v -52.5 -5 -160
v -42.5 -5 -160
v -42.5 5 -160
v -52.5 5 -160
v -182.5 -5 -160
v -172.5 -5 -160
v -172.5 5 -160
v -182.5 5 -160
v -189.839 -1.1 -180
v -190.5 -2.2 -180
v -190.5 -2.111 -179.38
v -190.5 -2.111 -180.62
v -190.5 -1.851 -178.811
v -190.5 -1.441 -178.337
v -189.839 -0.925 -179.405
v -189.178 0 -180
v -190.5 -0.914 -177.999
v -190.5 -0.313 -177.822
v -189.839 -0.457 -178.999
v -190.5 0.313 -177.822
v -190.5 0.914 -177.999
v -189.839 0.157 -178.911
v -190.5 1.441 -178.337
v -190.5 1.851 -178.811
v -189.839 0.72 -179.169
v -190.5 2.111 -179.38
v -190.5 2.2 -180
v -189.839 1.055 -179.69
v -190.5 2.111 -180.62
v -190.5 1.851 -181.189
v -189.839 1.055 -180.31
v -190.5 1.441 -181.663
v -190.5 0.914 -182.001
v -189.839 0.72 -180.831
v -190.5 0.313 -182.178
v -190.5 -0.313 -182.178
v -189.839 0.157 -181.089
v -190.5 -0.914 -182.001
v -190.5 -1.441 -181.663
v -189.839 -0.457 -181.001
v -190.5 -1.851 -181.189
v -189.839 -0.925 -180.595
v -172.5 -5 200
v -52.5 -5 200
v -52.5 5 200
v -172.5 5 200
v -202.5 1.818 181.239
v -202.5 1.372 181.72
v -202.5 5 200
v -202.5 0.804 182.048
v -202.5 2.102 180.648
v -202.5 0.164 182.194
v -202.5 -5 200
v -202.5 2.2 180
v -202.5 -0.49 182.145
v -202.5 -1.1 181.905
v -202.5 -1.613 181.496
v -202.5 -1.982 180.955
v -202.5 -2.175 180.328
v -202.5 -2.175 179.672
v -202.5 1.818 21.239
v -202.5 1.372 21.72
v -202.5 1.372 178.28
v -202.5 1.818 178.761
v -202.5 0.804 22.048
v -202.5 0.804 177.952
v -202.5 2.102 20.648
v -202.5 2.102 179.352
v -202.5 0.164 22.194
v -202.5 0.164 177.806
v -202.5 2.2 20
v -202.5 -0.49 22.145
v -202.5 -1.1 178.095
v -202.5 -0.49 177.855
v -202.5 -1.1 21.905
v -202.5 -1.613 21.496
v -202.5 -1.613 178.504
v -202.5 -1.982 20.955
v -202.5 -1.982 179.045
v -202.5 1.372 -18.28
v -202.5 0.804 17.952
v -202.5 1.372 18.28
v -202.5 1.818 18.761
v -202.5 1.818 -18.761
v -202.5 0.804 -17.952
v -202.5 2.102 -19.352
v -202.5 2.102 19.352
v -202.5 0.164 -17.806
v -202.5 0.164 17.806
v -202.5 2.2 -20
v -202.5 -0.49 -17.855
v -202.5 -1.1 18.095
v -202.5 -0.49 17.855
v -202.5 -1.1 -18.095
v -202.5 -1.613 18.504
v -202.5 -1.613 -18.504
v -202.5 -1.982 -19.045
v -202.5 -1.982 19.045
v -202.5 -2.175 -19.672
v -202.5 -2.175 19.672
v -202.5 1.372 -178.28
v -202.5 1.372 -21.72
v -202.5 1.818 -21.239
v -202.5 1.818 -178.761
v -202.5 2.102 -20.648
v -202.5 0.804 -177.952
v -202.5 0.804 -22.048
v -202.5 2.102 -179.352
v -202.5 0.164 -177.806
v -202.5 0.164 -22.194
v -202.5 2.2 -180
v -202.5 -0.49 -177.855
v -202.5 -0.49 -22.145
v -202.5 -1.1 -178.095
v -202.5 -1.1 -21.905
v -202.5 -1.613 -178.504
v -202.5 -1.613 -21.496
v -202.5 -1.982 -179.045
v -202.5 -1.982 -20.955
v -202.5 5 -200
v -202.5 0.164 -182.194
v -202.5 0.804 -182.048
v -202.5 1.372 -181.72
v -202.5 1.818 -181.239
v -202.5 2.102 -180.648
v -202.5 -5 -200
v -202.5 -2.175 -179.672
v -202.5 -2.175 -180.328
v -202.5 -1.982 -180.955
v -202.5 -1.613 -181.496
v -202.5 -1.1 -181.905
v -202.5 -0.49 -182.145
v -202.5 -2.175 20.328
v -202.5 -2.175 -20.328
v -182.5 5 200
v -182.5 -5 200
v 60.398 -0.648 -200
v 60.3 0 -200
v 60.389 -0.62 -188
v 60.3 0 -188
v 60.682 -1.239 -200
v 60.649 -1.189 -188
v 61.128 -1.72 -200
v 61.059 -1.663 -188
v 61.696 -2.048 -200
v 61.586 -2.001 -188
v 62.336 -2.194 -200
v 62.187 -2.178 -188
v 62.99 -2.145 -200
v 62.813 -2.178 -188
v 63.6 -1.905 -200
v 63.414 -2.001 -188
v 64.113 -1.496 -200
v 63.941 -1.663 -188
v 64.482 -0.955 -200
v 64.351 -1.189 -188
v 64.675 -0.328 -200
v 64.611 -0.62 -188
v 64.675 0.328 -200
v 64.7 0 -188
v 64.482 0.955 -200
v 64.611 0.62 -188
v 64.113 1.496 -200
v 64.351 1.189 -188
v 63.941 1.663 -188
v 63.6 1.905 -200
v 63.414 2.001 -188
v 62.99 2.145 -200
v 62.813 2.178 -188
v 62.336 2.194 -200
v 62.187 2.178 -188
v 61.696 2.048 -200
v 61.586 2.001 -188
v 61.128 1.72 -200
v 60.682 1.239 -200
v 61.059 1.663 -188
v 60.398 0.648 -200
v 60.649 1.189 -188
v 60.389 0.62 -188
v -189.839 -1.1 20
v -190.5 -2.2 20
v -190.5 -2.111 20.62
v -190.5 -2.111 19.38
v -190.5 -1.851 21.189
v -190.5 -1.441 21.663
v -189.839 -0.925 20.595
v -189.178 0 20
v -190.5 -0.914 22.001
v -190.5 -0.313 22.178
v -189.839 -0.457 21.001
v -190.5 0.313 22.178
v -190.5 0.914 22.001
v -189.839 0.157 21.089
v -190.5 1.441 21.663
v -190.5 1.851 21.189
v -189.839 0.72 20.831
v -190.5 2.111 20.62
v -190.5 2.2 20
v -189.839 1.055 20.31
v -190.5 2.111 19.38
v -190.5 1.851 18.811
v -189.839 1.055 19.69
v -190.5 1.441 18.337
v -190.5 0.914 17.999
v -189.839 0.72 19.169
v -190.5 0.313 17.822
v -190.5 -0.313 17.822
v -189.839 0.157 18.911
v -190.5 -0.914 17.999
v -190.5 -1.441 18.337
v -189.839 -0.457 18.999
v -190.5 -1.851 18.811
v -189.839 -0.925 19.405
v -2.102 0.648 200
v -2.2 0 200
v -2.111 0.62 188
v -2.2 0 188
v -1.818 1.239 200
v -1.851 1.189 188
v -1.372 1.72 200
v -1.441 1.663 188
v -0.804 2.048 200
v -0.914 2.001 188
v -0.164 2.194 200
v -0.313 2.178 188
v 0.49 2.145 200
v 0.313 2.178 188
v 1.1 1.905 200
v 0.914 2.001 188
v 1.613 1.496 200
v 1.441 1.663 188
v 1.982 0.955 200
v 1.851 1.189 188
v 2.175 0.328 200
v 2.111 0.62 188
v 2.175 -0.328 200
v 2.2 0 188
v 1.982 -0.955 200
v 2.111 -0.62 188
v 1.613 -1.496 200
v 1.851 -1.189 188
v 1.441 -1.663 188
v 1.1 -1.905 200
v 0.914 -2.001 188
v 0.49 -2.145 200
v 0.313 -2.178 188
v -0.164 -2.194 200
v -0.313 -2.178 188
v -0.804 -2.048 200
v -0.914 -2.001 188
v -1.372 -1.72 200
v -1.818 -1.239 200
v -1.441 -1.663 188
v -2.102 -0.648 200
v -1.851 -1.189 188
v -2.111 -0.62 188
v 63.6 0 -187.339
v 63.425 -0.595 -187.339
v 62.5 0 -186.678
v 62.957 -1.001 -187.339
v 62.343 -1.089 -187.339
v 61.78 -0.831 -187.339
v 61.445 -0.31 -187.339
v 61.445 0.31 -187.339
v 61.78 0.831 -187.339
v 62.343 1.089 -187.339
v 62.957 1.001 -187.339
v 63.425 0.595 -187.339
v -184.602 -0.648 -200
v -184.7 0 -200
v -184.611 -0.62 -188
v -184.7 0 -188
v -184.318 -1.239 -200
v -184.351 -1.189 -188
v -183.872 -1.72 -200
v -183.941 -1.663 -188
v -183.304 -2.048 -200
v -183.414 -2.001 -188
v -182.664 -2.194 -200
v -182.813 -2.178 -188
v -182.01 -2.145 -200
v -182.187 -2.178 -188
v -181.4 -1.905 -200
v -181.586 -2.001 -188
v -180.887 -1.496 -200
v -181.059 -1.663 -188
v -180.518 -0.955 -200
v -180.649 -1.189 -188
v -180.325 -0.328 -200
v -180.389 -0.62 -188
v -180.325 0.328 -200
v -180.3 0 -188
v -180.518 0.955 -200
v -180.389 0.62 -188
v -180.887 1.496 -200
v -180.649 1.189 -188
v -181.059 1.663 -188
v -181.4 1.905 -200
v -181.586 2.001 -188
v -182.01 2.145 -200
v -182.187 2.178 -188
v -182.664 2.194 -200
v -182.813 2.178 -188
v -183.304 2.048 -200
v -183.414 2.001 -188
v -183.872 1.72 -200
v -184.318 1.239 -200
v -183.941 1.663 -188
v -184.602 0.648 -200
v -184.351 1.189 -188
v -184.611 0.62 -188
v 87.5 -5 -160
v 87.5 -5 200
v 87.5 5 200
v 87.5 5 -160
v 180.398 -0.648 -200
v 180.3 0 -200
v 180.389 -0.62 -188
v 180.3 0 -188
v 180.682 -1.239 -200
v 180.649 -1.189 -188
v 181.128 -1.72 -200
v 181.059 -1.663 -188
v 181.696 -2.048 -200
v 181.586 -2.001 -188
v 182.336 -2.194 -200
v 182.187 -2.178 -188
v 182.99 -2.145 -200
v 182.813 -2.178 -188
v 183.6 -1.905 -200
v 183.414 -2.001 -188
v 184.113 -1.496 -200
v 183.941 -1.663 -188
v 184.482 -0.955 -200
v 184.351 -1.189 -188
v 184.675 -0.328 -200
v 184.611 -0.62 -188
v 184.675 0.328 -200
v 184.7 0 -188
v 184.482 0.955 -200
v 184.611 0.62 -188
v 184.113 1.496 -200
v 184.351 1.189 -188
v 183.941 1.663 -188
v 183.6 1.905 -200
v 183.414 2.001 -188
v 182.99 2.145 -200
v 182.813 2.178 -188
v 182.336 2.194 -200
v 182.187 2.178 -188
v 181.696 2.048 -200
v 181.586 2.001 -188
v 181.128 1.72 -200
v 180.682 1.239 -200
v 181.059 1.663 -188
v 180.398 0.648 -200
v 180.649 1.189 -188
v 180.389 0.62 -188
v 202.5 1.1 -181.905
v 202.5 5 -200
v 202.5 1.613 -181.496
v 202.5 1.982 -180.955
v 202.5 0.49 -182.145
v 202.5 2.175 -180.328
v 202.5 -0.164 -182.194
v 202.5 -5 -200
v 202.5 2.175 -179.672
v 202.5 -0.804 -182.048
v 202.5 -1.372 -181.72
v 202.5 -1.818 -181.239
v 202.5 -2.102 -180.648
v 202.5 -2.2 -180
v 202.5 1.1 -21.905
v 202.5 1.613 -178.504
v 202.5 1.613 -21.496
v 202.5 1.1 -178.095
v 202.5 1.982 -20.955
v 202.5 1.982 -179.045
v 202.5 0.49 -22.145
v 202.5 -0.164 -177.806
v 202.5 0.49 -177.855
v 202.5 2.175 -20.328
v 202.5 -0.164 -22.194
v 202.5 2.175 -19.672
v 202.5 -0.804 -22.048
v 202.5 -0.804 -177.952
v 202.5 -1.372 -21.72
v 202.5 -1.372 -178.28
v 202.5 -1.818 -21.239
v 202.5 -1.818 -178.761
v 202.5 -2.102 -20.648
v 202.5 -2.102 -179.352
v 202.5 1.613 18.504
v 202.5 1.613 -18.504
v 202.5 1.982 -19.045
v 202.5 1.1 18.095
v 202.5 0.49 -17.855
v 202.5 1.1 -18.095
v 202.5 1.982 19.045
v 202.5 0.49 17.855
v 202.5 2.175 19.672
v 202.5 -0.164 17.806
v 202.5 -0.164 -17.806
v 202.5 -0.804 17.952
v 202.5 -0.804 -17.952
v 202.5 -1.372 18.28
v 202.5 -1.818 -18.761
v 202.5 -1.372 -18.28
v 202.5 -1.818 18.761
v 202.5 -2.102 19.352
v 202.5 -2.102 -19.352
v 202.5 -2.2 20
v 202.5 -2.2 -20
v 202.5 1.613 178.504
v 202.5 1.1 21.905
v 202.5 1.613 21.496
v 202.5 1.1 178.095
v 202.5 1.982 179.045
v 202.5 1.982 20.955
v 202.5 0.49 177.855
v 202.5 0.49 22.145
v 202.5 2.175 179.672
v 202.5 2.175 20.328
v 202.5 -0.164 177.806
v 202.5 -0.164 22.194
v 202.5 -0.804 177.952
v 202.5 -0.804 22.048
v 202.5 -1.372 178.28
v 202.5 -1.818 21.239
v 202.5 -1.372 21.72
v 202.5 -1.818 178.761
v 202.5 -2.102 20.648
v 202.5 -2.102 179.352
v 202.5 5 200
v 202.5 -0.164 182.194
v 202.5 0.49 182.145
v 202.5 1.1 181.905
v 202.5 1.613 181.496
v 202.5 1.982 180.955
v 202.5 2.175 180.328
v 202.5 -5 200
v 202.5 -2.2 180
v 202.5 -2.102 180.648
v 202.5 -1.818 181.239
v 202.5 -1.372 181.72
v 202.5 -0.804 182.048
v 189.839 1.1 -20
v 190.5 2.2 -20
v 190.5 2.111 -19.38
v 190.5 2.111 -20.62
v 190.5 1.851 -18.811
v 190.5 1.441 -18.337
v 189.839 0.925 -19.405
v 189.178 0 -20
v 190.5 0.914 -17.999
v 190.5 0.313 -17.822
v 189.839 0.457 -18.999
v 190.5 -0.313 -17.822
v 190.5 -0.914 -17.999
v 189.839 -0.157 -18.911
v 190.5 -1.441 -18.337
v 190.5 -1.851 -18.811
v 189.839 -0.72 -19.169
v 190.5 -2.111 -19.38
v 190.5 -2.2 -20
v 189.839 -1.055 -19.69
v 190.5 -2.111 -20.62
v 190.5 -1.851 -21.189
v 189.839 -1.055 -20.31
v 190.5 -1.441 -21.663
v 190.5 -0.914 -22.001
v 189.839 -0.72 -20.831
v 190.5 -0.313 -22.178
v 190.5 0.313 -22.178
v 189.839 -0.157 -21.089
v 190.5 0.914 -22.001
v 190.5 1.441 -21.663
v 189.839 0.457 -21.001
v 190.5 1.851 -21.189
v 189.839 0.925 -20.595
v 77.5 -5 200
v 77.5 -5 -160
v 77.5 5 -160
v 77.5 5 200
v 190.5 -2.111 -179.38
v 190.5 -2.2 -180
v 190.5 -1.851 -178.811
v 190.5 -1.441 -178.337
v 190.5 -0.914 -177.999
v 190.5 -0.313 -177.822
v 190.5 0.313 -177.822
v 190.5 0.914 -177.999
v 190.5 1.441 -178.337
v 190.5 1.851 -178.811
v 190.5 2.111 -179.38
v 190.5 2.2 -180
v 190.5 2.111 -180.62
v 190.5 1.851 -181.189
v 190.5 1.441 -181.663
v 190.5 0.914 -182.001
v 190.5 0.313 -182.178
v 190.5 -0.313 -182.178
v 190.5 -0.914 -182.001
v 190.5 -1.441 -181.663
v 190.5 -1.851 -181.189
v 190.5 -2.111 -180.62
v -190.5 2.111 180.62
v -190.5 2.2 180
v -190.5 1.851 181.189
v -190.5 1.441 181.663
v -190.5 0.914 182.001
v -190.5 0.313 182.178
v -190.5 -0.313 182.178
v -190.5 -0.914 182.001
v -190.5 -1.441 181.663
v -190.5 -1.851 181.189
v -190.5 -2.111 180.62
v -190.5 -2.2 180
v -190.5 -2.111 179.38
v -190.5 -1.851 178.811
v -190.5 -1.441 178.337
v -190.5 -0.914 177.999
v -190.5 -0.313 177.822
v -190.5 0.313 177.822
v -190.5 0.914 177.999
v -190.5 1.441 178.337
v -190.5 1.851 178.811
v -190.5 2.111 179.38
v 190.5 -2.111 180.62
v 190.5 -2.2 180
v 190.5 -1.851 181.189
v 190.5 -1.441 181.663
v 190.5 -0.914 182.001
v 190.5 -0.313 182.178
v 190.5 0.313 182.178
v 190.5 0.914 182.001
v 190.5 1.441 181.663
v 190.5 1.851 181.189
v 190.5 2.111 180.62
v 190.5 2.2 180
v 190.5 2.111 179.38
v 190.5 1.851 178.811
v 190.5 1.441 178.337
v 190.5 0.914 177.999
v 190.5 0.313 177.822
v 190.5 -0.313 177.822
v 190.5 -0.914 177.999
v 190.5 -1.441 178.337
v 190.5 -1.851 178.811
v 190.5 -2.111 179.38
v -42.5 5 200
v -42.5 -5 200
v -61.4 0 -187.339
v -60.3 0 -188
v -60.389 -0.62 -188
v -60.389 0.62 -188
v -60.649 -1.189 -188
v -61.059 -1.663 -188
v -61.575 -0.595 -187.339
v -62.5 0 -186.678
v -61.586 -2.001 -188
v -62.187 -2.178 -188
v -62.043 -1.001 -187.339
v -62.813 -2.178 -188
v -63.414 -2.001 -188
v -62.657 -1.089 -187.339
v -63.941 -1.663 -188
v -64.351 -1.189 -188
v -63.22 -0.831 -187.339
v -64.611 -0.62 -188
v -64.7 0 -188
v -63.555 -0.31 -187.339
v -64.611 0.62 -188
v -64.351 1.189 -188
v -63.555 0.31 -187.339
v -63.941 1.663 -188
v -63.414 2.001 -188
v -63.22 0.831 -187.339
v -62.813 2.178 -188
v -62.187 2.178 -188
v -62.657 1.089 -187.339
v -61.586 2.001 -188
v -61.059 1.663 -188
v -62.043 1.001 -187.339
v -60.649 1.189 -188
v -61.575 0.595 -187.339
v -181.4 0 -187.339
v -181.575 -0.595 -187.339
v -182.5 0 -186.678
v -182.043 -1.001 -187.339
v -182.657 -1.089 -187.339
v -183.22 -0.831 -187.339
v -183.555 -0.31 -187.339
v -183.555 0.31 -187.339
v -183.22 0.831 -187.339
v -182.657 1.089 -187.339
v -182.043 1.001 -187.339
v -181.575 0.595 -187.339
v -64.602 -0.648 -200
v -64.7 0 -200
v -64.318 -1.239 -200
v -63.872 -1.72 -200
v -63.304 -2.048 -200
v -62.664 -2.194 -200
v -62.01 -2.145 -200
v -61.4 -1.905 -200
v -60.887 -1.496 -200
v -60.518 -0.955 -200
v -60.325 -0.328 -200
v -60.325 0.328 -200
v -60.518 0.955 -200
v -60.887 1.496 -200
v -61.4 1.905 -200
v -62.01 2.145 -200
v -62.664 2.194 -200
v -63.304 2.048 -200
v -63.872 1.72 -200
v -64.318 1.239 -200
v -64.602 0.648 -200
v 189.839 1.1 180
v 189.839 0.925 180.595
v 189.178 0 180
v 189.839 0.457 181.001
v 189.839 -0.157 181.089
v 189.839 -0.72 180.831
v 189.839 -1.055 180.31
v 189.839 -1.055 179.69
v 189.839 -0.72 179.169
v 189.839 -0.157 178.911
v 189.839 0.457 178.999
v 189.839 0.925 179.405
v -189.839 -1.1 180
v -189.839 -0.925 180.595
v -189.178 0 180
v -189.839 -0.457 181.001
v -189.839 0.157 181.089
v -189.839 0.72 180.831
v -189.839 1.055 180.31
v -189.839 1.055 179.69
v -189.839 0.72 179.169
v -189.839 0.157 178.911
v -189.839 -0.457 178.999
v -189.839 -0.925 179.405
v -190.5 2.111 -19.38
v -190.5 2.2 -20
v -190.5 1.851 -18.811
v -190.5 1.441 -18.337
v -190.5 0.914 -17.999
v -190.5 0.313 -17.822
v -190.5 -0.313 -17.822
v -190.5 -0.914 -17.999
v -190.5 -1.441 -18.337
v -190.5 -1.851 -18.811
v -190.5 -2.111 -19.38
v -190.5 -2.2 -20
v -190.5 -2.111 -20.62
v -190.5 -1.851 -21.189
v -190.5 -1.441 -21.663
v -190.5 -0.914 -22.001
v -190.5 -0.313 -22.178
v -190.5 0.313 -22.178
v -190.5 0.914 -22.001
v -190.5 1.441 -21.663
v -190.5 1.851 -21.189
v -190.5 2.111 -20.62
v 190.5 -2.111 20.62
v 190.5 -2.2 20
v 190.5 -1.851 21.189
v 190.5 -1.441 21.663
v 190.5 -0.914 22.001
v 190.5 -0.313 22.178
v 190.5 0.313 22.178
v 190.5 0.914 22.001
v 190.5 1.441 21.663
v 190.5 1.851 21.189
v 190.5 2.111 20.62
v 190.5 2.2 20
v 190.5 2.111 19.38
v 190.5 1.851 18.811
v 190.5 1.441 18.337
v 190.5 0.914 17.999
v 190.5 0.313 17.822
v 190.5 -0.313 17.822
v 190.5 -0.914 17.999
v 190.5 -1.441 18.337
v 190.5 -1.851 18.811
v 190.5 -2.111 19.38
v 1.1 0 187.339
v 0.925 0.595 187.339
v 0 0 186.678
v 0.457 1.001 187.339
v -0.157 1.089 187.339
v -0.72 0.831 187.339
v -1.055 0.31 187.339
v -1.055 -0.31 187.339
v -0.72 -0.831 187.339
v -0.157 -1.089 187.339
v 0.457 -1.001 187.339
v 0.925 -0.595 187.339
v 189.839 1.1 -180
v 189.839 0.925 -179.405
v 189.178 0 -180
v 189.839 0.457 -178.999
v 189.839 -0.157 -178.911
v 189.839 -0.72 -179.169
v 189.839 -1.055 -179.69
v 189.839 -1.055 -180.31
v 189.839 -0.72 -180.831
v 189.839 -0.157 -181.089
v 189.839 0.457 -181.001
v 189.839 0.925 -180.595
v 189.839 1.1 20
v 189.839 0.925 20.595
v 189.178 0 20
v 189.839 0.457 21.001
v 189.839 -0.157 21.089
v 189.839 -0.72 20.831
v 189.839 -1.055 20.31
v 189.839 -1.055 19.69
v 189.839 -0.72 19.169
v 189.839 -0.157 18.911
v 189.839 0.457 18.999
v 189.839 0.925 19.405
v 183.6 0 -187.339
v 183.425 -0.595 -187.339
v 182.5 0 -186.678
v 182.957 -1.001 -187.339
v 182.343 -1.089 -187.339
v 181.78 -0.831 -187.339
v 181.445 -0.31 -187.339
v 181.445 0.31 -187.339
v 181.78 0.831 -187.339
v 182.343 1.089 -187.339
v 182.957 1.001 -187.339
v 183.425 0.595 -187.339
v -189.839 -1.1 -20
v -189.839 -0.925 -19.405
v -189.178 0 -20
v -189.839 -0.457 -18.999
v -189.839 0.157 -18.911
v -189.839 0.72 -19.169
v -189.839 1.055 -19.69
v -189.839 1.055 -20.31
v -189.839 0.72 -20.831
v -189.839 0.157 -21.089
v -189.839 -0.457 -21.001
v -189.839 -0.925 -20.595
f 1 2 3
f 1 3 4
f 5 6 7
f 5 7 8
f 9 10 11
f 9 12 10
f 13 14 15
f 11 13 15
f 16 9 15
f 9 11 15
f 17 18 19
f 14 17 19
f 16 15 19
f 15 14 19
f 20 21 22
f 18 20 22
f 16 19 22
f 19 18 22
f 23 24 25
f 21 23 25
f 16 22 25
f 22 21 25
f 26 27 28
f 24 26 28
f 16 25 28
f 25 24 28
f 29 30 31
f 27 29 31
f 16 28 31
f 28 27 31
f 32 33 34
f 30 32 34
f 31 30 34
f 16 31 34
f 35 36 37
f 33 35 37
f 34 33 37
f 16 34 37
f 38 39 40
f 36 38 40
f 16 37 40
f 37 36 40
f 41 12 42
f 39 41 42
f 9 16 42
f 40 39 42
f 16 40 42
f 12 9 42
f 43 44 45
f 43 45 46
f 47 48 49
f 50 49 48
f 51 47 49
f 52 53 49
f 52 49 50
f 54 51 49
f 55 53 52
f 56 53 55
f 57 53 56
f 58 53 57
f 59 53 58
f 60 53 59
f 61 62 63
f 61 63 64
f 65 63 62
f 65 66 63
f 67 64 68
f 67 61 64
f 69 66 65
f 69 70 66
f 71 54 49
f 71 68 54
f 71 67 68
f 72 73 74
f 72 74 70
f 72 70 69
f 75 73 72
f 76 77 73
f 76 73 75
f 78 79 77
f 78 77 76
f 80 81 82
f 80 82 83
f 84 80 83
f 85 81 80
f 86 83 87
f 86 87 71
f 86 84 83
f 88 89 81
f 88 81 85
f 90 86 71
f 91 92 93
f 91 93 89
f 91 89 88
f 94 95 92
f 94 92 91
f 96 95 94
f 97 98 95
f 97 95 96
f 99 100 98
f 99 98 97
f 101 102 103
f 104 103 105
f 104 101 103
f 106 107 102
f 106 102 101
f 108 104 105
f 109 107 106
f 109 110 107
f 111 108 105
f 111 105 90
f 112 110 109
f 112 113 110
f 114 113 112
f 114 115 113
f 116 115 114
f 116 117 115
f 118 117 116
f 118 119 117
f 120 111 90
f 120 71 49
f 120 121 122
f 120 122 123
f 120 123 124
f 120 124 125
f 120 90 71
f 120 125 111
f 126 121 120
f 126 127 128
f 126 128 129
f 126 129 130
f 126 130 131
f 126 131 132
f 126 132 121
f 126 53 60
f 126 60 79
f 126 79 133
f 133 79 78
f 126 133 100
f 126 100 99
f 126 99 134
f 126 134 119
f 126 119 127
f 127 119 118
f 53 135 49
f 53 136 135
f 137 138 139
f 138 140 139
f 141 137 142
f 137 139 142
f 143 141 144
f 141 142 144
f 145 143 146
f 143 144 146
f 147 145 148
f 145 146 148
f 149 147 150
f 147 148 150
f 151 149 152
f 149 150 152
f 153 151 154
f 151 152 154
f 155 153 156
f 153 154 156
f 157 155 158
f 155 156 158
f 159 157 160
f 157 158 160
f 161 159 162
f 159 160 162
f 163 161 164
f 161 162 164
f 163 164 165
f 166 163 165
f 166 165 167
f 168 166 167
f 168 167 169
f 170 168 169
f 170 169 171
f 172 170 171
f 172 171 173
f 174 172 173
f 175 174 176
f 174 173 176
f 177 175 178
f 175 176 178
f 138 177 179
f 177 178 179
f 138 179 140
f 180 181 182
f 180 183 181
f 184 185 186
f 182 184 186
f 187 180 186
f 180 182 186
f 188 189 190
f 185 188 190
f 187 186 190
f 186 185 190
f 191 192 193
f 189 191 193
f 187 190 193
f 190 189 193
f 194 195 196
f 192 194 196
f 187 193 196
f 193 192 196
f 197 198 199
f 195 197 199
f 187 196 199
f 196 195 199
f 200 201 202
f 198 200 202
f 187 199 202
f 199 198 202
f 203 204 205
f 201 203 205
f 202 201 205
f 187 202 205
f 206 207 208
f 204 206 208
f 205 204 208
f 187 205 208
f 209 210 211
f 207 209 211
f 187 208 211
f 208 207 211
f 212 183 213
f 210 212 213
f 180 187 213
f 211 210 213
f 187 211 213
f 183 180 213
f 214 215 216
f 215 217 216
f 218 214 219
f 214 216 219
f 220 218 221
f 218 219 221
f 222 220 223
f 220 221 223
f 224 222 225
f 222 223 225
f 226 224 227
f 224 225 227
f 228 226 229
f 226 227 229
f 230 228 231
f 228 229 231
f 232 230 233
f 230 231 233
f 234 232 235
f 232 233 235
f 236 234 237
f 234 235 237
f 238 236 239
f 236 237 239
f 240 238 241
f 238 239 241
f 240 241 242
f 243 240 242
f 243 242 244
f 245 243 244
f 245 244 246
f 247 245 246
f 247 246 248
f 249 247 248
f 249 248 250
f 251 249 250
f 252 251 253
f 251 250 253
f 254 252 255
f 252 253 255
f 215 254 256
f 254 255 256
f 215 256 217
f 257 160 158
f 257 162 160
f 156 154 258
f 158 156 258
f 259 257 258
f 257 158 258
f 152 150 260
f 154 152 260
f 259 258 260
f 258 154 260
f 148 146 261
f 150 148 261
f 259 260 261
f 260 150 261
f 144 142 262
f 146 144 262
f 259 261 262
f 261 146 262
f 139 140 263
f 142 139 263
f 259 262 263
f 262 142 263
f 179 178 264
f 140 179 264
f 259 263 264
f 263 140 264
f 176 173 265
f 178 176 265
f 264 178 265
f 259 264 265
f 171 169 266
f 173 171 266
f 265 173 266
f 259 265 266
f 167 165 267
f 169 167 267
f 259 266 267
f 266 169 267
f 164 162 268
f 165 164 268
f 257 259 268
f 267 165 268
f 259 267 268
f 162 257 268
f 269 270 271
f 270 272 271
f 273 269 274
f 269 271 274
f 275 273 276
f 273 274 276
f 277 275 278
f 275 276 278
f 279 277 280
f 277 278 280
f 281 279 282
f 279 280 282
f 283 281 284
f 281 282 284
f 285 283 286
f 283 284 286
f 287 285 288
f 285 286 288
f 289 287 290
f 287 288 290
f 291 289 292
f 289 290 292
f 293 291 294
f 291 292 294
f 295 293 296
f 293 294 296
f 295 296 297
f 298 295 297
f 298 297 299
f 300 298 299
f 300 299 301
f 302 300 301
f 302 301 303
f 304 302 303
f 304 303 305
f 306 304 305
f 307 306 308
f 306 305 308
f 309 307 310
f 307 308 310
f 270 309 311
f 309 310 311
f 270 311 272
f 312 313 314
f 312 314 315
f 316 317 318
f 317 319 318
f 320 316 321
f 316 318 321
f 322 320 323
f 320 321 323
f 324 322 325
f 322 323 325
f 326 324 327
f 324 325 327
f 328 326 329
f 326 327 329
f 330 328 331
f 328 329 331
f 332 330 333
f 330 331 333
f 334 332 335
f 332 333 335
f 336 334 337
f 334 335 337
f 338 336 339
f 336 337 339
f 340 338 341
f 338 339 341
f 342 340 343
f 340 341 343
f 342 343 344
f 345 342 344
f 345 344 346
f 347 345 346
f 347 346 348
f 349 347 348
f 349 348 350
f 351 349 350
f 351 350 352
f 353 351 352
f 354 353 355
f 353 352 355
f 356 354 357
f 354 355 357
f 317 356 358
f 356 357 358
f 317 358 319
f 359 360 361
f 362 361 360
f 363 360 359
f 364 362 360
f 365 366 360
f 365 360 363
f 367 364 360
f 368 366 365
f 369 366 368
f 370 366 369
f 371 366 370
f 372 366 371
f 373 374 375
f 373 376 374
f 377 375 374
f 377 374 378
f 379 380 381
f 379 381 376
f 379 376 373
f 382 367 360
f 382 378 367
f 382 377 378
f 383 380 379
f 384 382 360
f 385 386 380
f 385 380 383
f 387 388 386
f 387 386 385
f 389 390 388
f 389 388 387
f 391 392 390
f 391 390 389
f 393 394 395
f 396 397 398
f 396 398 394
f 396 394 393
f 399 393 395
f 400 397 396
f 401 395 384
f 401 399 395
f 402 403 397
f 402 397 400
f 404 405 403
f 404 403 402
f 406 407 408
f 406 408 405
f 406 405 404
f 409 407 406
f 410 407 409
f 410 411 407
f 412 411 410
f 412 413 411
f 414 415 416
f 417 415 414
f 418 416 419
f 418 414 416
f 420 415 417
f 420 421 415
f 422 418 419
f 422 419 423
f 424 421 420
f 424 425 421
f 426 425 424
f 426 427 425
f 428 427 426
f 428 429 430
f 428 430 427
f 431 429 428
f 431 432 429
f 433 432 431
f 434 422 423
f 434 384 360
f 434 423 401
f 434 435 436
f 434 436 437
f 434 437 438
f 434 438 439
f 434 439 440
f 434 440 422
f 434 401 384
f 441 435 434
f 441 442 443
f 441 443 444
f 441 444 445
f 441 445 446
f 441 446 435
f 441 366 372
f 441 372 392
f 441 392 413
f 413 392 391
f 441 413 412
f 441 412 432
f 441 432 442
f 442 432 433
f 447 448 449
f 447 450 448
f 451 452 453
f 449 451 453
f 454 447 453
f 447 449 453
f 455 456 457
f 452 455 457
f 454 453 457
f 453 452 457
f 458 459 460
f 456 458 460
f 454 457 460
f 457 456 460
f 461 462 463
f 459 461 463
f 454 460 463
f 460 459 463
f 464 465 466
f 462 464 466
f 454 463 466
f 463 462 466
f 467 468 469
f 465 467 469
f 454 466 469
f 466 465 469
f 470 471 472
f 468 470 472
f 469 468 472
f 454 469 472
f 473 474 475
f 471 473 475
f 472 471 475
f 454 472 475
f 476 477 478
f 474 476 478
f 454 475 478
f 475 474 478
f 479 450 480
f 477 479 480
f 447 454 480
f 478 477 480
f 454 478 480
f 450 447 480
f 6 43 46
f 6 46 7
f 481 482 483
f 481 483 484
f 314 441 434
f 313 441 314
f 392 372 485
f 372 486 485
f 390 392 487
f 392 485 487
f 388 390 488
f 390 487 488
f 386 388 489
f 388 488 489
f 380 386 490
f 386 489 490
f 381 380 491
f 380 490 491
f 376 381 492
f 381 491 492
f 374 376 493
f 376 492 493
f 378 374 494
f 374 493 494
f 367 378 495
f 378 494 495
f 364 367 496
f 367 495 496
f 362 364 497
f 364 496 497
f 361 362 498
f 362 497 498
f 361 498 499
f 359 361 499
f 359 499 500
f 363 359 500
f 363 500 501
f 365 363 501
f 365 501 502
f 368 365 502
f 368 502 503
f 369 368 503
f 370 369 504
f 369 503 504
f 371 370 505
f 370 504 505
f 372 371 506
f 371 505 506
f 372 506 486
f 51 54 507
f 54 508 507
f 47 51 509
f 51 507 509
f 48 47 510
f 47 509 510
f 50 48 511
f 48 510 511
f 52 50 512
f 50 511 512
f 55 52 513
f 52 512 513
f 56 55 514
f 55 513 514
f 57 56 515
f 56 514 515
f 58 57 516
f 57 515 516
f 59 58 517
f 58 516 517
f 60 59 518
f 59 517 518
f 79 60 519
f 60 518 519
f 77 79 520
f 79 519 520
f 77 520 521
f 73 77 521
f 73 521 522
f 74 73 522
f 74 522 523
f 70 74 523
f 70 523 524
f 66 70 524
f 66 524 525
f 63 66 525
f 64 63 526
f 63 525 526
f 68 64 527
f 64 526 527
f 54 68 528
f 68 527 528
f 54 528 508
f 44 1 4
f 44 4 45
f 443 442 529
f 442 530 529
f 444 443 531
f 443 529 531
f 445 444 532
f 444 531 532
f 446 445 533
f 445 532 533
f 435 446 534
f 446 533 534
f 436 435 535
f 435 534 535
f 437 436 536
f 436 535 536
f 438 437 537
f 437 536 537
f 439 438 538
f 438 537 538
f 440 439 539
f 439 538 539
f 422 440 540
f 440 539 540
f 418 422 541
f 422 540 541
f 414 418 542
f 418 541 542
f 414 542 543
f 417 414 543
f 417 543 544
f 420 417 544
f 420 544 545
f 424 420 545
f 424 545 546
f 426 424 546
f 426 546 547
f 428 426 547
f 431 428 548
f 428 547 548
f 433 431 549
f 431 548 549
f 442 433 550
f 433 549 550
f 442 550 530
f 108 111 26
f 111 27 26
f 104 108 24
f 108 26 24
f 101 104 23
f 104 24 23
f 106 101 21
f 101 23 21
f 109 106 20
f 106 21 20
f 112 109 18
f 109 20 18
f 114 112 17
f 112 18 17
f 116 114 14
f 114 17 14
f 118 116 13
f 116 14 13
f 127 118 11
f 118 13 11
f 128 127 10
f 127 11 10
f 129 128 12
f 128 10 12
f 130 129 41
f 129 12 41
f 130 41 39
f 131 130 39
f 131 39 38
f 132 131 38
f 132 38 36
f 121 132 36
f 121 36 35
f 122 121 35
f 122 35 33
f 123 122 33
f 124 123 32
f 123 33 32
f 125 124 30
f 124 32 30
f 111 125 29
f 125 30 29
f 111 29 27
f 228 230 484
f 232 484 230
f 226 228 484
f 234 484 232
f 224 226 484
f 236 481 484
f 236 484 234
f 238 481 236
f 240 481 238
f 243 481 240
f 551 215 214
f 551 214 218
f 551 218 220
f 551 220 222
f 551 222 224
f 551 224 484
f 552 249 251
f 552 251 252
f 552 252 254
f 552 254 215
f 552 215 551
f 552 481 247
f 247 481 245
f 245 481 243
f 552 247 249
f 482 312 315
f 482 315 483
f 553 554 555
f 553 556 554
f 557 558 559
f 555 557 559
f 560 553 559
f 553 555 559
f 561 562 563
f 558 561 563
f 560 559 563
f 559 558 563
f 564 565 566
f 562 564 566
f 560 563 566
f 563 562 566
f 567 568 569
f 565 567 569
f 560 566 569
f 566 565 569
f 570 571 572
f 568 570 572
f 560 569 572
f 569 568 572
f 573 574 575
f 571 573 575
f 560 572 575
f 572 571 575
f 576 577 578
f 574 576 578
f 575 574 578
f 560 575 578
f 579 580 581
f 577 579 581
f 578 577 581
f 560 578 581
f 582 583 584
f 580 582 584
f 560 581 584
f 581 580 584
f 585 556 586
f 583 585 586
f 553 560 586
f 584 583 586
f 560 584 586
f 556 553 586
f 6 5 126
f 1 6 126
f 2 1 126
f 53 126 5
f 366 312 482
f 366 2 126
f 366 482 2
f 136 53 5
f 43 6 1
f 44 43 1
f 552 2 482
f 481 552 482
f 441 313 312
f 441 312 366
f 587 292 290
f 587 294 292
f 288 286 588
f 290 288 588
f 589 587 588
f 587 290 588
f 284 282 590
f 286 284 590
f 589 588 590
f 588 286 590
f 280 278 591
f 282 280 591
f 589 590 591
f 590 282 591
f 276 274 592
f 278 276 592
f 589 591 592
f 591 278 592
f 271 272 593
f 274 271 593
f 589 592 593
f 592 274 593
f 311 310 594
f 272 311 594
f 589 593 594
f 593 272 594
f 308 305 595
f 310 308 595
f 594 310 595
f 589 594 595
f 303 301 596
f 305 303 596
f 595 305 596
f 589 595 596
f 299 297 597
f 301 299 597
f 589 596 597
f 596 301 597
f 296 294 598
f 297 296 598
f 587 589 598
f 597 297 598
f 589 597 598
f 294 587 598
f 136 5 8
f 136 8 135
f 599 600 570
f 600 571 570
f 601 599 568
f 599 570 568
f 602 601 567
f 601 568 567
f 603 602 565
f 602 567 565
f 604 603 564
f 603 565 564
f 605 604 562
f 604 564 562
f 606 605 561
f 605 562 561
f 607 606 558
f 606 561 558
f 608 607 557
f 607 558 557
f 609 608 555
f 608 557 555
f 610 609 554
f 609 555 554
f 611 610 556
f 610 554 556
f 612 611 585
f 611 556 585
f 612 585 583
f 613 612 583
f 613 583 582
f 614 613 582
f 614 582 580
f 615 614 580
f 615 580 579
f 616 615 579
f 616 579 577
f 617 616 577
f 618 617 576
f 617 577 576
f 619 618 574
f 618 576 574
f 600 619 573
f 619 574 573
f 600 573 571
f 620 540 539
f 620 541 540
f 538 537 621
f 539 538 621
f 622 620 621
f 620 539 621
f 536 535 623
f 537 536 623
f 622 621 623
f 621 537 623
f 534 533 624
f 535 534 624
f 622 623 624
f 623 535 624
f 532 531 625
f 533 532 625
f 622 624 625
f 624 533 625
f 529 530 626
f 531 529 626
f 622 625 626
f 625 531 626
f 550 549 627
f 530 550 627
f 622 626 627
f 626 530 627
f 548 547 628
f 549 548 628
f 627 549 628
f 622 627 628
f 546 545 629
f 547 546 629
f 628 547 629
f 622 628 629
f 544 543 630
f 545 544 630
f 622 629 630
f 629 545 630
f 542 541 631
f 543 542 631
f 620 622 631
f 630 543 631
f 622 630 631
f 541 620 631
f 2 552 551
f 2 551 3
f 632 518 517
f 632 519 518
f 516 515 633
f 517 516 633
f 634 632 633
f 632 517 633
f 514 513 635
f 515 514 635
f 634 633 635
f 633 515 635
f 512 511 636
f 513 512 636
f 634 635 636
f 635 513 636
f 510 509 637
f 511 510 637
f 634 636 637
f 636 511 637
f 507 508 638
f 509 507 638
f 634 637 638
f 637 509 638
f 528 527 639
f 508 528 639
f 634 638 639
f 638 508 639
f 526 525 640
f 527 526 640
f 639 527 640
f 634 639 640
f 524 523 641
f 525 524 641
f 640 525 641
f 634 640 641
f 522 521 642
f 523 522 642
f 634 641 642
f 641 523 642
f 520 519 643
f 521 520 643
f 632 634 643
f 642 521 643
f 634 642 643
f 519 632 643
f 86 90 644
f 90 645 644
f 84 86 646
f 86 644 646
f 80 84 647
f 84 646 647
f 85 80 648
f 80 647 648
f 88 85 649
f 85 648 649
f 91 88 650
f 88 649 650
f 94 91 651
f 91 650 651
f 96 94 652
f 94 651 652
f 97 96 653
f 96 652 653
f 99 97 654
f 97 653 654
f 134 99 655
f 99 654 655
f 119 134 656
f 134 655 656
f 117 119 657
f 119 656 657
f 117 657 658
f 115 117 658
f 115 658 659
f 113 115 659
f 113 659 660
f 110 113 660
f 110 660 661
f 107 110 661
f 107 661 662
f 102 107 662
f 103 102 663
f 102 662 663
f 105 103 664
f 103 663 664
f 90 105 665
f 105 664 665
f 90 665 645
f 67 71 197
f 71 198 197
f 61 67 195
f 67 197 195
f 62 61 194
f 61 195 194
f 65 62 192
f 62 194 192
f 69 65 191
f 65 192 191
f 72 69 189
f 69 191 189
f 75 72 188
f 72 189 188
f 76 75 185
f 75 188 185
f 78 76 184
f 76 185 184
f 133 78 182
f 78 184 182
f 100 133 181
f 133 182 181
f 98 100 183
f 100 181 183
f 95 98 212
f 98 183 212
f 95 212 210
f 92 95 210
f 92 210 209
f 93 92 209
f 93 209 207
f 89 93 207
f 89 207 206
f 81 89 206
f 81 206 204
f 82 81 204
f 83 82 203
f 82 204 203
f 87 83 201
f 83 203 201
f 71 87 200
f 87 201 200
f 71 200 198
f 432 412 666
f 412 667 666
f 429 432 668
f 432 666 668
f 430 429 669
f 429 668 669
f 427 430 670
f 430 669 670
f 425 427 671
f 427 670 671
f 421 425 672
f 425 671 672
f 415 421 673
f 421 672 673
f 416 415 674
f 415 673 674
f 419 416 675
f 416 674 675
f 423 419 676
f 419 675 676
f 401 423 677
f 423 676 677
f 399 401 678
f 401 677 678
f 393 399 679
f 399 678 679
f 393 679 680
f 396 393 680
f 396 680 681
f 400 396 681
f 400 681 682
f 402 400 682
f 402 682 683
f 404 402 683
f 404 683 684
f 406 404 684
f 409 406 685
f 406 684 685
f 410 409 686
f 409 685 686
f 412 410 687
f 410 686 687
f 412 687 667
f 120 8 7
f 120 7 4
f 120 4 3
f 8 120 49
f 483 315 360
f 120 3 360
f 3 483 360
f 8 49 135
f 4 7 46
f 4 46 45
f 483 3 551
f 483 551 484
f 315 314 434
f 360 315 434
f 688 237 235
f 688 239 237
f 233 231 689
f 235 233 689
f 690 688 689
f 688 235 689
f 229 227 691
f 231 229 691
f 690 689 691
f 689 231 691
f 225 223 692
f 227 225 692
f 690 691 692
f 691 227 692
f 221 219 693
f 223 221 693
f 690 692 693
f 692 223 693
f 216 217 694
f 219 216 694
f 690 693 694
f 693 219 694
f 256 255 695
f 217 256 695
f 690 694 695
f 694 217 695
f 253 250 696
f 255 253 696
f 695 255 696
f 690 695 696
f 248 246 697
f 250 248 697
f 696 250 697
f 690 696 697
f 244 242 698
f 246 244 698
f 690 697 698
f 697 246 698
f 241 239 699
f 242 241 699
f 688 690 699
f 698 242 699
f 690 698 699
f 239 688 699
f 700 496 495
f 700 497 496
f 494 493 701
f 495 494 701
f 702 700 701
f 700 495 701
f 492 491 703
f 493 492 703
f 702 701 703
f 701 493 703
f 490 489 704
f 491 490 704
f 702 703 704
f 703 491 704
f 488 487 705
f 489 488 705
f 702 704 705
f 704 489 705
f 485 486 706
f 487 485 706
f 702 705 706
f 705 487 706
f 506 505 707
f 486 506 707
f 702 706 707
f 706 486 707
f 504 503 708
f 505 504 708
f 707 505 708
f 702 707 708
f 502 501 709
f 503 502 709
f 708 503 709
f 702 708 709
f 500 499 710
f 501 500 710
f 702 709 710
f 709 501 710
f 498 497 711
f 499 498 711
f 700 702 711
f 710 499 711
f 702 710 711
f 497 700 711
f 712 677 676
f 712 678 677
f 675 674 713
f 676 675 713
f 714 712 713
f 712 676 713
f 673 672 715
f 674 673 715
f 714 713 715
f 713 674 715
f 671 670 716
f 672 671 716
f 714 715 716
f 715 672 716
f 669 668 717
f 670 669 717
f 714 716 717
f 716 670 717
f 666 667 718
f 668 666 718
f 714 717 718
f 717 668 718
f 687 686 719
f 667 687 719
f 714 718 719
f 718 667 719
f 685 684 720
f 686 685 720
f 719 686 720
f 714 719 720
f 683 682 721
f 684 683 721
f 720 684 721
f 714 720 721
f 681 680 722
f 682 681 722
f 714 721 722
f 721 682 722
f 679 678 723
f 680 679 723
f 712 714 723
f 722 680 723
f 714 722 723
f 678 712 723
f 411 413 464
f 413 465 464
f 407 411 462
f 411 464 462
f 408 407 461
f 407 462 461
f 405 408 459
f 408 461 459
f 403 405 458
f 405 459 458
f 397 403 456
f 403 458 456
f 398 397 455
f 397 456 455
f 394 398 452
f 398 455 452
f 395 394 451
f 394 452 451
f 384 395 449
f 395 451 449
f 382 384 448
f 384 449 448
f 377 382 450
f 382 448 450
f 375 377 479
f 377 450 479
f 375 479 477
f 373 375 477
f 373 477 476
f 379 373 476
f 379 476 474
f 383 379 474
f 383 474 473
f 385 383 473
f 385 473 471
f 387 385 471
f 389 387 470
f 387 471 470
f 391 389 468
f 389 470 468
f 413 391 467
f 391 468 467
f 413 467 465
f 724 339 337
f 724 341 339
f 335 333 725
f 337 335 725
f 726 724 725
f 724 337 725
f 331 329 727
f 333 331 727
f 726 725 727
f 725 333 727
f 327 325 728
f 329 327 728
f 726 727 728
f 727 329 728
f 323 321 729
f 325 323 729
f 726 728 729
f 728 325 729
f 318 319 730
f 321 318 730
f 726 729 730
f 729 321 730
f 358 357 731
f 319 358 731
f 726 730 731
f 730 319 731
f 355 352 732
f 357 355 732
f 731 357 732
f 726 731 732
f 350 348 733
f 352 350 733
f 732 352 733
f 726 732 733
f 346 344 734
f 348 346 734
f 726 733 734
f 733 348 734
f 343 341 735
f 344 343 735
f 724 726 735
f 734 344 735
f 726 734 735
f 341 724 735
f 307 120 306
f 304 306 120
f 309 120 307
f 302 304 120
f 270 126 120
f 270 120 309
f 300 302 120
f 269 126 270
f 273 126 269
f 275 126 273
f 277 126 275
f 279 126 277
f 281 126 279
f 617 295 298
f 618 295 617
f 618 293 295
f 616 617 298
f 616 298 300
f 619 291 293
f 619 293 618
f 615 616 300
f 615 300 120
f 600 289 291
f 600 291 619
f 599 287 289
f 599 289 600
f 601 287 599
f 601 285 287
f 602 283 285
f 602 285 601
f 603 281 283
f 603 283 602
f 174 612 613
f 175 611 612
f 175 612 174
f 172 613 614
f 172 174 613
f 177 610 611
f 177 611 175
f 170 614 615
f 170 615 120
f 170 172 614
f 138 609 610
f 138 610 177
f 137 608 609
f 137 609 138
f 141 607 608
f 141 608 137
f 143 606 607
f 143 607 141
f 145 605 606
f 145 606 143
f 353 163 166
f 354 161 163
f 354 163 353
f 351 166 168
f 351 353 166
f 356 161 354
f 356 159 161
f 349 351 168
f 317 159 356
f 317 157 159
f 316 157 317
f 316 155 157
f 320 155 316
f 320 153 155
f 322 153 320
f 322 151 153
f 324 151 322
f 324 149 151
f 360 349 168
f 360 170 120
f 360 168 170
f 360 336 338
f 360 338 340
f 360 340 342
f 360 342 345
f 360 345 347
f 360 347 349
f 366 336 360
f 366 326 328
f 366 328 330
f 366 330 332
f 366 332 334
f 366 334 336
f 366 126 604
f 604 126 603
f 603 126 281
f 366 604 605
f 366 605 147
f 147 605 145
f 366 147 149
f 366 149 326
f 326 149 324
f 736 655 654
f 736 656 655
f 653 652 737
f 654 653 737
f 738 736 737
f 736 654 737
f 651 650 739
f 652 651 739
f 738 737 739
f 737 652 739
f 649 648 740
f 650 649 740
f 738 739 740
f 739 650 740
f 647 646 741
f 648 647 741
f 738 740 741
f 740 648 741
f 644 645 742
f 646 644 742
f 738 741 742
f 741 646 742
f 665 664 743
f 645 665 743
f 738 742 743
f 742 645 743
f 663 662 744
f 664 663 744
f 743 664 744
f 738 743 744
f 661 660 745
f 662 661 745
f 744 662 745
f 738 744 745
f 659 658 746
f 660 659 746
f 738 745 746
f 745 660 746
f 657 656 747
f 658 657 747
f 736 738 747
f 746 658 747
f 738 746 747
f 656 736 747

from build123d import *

# Parameters (mm, degrees)
F1_DEPTH       = 5
F6_D           = 4.4
F6_DEPTH       = 12
F6_TIP         = 1.3218933619
F7_D           = 4.4
F7_DEPTH       = 12
F7_TIP         = 1.3218933619
F7_ON_F4_D     = 4.4
F7_ON_F4_DEPTH = 12
F7_ON_F4_TIP   = 1.3218933619
F7_ON_F5_D     = 4.4
F7_ON_F5_DEPTH = 12
F7_ON_F5_TIP   = 1.3218933619


# Not quite as in the source:
# - a feature names something its author has since deleted; it is built from what else it names


with BuildPart() as f1:
    # F0 (on Front) → F1 (new body, symmetric)
    with BuildSketch(Plane.XZ):
        Polygon((-202.5, -200), (202.5, -200), (202.5, 200), (87.5, 200), (87.5, -160), (77.5, -160), (77.5, 200), (-42.5, 200), (-42.5, -160), (-52.5, -160), (-52.5, 200), (-172.5, 200), (-172.5, -160), (-182.5, -160), (-182.5, 200), (-202.5, 200), align=None)
    extrude(amount=F1_DEPTH, both=True)

    # F6
    with Locations(Plane.XY.offset(200)):
        with Locations((0, 0)):
            Hole(F6_D / 2, depth=F6_DEPTH)
            with Locations((0, 0, -(F6_DEPTH + F6_TIP / 2))):  # 118° drill point
                Cone(0, F6_D / 2, F6_TIP, mode=Mode.SUBTRACT)

    # F7
    with Locations(Plane(origin=(-202.5, 0, 0), x_dir=(0, -1, 0), z_dir=(-1, 0, 0))):
        with Locations((0, -180), (0, -20), (0, 20), (0, 180)):
            Hole(F7_D / 2, depth=F7_DEPTH)
            with Locations((0, 0, -(F7_DEPTH + F7_TIP / 2))):  # 118° drill point
                Cone(0, F7_D / 2, F7_TIP, mode=Mode.SUBTRACT)

    # F7 on F4
    with Locations(Plane.YZ.offset(202.5)):
        with Locations((0, -180), (0, -20), (0, 180), (0, 20)):
            Hole(F7_ON_F4_D / 2, depth=F7_ON_F4_DEPTH)
            with Locations((0, 0, -(F7_ON_F4_DEPTH + F7_ON_F4_TIP / 2))):  # 118° drill point
                Cone(0, F7_ON_F4_D / 2, F7_ON_F4_TIP, mode=Mode.SUBTRACT)

    # F7 on F5
    with Locations(Plane(origin=(0, 0, -200), x_dir=(1, 0, 0), z_dir=(0, 0, -1))):
        with Locations((-182.5, 0), (-62.5, 0), (62.5, 0), (182.5, 0)):
            Hole(F7_ON_F5_D / 2, depth=F7_ON_F5_DEPTH)
            with Locations((0, 0, -(F7_ON_F5_DEPTH + F7_ON_F5_TIP / 2))):  # 118° drill point
                Cone(0, F7_ON_F5_D / 2, F7_ON_F5_TIP, mode=Mode.SUBTRACT)


solid = f1.part
